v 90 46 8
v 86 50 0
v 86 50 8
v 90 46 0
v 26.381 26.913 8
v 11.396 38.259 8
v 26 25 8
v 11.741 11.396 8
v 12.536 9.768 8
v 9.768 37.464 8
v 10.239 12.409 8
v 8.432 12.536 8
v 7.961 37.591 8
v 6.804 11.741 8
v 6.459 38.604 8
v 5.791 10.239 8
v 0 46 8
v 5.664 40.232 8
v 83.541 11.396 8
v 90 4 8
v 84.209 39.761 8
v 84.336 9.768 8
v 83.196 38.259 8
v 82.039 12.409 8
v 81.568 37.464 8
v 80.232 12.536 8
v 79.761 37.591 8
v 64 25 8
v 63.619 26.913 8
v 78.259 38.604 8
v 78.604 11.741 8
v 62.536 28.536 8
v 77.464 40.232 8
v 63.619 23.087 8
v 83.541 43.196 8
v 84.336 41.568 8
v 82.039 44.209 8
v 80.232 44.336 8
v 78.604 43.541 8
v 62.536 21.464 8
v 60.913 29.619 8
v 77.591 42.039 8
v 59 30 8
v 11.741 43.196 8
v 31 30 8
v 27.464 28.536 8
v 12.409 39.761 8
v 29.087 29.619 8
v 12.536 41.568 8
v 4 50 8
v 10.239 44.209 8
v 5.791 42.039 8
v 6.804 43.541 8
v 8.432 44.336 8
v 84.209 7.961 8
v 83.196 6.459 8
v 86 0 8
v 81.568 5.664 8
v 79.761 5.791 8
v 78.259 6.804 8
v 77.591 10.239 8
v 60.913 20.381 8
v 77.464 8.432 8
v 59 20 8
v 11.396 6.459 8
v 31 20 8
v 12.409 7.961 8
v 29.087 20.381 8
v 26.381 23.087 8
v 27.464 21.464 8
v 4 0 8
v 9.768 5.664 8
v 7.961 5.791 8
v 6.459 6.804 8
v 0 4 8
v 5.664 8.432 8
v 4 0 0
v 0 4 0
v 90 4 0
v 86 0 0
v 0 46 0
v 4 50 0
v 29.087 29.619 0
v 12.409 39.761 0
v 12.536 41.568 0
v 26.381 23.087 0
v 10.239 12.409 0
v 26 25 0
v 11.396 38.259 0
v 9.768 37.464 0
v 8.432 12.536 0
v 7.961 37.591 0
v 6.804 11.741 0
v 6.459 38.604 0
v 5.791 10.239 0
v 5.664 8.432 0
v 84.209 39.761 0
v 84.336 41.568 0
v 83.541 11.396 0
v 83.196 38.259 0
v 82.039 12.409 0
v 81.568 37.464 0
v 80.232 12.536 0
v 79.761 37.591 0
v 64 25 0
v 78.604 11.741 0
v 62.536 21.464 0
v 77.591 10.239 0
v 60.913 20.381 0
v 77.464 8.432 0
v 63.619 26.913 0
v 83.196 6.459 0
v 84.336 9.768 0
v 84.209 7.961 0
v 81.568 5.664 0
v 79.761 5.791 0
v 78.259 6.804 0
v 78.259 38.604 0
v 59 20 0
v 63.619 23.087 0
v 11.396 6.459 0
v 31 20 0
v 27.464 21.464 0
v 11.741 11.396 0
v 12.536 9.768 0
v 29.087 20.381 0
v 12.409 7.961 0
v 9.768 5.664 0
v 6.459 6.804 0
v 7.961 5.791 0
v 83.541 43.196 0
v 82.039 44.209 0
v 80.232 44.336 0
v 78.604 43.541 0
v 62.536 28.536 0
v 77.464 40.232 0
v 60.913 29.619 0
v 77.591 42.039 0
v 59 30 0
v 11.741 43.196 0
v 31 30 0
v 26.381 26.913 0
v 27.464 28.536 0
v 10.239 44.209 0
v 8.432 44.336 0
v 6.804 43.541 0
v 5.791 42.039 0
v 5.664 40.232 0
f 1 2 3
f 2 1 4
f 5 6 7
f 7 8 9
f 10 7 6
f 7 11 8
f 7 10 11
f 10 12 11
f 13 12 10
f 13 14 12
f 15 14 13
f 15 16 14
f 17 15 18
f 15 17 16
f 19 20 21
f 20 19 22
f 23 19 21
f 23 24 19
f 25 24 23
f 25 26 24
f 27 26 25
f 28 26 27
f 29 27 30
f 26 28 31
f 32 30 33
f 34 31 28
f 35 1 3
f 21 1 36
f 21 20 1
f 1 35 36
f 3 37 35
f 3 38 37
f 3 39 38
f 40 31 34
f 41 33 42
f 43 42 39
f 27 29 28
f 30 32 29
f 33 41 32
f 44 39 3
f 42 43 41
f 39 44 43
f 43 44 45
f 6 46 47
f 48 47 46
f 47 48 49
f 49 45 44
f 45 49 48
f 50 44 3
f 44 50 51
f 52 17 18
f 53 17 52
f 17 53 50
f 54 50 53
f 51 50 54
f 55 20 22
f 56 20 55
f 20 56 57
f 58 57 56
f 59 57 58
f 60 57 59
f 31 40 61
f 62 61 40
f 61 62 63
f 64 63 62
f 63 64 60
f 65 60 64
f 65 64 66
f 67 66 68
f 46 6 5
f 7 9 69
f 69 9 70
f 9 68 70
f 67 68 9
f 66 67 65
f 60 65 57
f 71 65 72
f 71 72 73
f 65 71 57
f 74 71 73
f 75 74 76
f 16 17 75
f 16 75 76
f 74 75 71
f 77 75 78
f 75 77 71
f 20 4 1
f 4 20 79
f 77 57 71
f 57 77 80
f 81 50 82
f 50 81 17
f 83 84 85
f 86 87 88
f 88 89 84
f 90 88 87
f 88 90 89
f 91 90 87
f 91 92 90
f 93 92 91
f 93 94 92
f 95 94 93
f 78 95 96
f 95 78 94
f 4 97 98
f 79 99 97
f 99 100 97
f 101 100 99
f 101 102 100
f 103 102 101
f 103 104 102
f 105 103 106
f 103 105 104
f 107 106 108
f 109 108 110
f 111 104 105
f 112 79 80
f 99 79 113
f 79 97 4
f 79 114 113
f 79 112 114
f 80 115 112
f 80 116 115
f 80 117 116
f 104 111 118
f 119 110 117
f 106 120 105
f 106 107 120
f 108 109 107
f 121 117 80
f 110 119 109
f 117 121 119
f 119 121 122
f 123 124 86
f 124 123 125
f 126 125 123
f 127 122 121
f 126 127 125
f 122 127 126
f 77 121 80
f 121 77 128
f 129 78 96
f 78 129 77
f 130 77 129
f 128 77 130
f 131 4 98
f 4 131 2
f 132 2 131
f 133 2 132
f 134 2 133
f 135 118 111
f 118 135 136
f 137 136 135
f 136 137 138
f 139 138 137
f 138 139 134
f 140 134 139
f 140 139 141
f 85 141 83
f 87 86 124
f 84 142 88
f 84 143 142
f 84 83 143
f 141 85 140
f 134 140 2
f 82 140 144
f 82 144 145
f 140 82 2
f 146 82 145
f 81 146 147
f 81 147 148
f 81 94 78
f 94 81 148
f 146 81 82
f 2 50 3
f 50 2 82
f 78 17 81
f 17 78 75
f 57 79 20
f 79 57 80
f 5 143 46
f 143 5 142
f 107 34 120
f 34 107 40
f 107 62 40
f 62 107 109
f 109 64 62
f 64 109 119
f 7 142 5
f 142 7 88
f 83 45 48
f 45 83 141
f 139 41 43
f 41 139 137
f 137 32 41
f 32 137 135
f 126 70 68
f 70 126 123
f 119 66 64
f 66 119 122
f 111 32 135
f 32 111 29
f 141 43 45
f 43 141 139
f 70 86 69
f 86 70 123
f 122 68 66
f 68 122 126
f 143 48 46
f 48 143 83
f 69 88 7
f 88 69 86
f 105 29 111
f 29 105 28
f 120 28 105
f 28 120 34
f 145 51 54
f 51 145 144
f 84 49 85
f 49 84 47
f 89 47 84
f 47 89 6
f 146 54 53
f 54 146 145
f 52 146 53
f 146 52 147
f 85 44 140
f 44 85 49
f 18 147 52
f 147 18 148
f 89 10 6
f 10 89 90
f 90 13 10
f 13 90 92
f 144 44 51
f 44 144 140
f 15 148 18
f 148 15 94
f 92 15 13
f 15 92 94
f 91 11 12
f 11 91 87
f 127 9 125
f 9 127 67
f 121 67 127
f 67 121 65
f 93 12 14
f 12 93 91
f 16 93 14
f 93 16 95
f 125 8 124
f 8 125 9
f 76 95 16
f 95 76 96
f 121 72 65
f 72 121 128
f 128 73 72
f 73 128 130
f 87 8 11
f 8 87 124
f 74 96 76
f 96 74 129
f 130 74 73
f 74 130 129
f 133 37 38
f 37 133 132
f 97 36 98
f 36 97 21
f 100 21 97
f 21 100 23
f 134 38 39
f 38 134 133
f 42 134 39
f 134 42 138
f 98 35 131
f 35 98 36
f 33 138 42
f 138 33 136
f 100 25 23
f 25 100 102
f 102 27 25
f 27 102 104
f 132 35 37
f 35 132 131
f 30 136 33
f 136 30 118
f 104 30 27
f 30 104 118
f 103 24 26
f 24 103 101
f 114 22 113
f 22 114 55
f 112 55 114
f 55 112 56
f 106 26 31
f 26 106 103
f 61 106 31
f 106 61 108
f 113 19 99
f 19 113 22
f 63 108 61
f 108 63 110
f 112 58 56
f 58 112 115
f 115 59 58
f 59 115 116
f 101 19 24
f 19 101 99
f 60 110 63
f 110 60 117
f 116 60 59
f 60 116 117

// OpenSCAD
$fn = 32;

// ----------------------------------------------------------------------
// Bracket plate: slot plate 90 x 50
// ----------------------------------------------------------------------

// --- parameters (mm) ---
hole_r = 3.5;             // bolt hole radius
plate_t = 8;              // plate thickness, Z (extrusion height)
plate_l = 90;             // plate length
plate_w = 50;             // plate width
slot_l = 28;              // slot straight length
slot_r = 5;               // slot end radius

slot_len = slot_l + 2 * slot_r;
slot_w = 2 * slot_r;
hole_d2 = 2 * hole_r;

profile = [[4, 0], [86, 0], [90, 4], [90, 46], [86, 50], [4, 50], [0, 46], [0, 4]];  // primary outline, 8 points, counter clockwise
void_1 = [[59, 20], [60.913, 20.381], [62.536, 21.464], [63.619, 23.087], [64, 25], [63.619, 26.913], [62.536, 28.536], [60.913, 29.619], [59, 30], [31, 30], [29.087, 29.619], [27.464, 28.536], [26.381, 26.913], [26, 25], [26.381, 23.087], [27.464, 21.464], [29.087, 20.381], [31, 20]];  // grip slot, 18 points
void_2 = [[12.536, 41.568], [11.741, 43.196], [10.239, 44.209], [8.432, 44.336], [6.804, 43.541], [5.791, 42.039], [5.664, 40.232], [6.459, 38.604], [7.961, 37.591], [9.768, 37.464], [11.396, 38.259], [12.409, 39.761]];  // corner hole, 12 points
void_3 = [[12.536, 9.768], [11.741, 11.396], [10.239, 12.409], [8.432, 12.536], [6.804, 11.741], [5.791, 10.239], [5.664, 8.432], [6.459, 6.804], [7.961, 5.791], [9.768, 5.664], [11.396, 6.459], [12.409, 7.961]];  // corner hole, 12 points
void_4 = [[84.336, 41.568], [83.541, 43.196], [82.039, 44.209], [80.232, 44.336], [78.604, 43.541], [77.591, 42.039], [77.464, 40.232], [78.259, 38.604], [79.761, 37.591], [81.568, 37.464], [83.196, 38.259], [84.209, 39.761]];  // corner hole, 12 points
void_5 = [[84.336, 9.768], [83.541, 11.396], [82.039, 12.409], [80.232, 12.536], [78.604, 11.741], [77.591, 10.239], [77.464, 8.432], [78.259, 6.804], [79.761, 5.791], [81.568, 5.664], [83.196, 6.459], [84.209, 7.961]];  // corner hole, 12 points

// --- the one profile operation ---
difference() {
  linear_extrude(height = plate_t) polygon(points = profile);
  translate([0, 0, -1])
    linear_extrude(height = plate_t + 2) polygon(points = void_1);
  translate([0, 0, -1])
    linear_extrude(height = plate_t + 2) polygon(points = void_2);
  translate([0, 0, -1])
    linear_extrude(height = plate_t + 2) polygon(points = void_3);
  translate([0, 0, -1])
    linear_extrude(height = plate_t + 2) polygon(points = void_4);
  translate([0, 0, -1])
    linear_extrude(height = plate_t + 2) polygon(points = void_5);
}
